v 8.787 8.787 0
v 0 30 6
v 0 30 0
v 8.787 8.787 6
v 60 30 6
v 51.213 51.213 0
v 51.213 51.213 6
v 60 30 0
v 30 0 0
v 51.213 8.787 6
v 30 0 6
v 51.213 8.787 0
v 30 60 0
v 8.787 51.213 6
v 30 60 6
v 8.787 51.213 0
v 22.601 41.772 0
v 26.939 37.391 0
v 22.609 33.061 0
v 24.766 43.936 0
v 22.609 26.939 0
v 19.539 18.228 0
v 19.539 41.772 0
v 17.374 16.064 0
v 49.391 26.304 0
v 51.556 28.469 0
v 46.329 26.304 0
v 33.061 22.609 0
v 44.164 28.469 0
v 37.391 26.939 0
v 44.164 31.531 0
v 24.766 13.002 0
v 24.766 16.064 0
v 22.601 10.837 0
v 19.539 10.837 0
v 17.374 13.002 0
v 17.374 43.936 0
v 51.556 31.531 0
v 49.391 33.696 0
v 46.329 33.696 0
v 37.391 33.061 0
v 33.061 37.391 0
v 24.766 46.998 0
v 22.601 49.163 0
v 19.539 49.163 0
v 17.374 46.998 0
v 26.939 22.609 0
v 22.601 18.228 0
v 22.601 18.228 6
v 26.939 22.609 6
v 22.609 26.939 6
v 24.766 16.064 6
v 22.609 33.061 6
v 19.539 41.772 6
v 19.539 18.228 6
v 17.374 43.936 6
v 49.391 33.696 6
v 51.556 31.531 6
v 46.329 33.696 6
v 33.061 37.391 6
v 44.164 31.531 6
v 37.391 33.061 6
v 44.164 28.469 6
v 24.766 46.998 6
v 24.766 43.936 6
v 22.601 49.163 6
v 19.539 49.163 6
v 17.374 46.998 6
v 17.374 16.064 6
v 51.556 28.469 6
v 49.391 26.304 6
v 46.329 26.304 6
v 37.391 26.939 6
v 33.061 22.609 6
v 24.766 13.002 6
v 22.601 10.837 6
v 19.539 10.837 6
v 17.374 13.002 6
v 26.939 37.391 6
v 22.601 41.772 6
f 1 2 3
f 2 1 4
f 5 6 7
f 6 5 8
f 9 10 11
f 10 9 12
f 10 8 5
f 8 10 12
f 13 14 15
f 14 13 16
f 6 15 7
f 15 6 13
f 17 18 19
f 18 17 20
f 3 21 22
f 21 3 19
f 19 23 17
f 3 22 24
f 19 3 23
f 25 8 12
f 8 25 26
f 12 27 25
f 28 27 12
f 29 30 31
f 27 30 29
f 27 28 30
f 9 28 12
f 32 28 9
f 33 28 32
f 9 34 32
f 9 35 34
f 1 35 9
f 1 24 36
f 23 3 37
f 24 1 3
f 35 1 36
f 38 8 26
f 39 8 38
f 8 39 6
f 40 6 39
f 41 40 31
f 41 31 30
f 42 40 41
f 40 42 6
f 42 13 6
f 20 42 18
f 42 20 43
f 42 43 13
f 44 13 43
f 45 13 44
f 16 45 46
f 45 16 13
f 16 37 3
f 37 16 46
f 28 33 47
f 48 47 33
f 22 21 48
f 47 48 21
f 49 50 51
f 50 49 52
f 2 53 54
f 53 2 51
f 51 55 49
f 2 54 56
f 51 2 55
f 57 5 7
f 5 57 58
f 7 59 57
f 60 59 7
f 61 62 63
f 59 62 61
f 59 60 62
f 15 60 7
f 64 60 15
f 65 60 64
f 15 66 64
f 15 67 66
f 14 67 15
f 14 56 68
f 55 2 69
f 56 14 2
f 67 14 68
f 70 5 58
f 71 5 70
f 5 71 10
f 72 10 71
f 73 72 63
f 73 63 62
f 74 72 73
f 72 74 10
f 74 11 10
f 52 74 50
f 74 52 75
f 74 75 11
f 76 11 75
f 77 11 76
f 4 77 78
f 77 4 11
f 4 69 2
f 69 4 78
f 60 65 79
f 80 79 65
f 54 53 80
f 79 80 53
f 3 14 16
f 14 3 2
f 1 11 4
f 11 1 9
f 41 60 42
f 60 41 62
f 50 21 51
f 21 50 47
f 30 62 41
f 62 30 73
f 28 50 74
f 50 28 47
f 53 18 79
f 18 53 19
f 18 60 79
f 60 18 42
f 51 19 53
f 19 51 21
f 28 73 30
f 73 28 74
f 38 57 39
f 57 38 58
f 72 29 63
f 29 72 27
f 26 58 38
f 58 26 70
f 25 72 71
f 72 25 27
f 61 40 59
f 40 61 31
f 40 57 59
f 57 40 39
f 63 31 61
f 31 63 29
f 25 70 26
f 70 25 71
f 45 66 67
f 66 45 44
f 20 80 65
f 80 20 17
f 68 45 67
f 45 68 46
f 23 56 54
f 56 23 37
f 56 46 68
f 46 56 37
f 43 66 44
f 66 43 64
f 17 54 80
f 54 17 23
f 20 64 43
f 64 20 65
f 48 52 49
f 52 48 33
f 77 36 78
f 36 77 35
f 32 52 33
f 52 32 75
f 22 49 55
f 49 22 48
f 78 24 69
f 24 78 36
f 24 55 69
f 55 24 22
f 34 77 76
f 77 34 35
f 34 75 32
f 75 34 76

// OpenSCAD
$fn = 32;

// ----------------------------------------------------------------------
// Polygon plate: 8-gon R30, 3 bolt windows
// ----------------------------------------------------------------------

// --- parameters (mm) ---
sides = 8;                // number of polygon sides
plate_r = 30;             // circumscribed radius of the polygon
bore_r = 8;               // centre bore radius
bolts = 3;                // number of bolt windows
ring_r = 17.86;           // bolt-circle radius
bolt_r = 4;               // bolt window radius
plate_t = 6;              // plate thickness, Z (extrusion height)

plate_d = 2 * plate_r;  // circumscribed diameter
bore_d = 2 * bore_r;  // centre bore diameter
bolt_d = 2 * bolt_r;  // bolt window diameter
ring_d = 2 * ring_r;  // bolt-circle diameter

profile = [[60, 30], [51.213, 51.213], [30, 60], [8.787, 51.213], [0, 30], [8.787, 8.787], [30, 0], [51.213, 8.787]];  // primary outline, 8 points, counter clockwise
void_1 = [[37.391, 33.061], [33.061, 37.391], [26.939, 37.391], [22.609, 33.061], [22.609, 26.939], [26.939, 22.609], [33.061, 22.609], [37.391, 26.939]];  // centre bore, 8 points
void_2 = [[51.556, 31.531], [49.391, 33.696], [46.329, 33.696], [44.164, 31.531], [44.164, 28.469], [46.329, 26.304], [49.391, 26.304], [51.556, 28.469]];  // bolt window 1, 8 points
void_3 = [[24.766, 46.998], [22.601, 49.163], [19.539, 49.163], [17.374, 46.998], [17.374, 43.936], [19.539, 41.772], [22.601, 41.772], [24.766, 43.936]];  // bolt window 2, 8 points
void_4 = [[24.766, 16.064], [22.601, 18.228], [19.539, 18.228], [17.374, 16.064], [17.374, 13.002], [19.539, 10.837], [22.601, 10.837], [24.766, 13.002]];  // bolt window 3, 8 points

// --- the one profile operation ---
difference() {
  linear_extrude(height = plate_t) polygon(points = profile);
  translate([0, 0, -1])
    linear_extrude(height = plate_t + 2) polygon(points = void_1);
  translate([0, 0, -1])
    linear_extrude(height = plate_t + 2) polygon(points = void_2);
  translate([0, 0, -1])
    linear_extrude(height = plate_t + 2) polygon(points = void_3);
  translate([0, 0, -1])
    linear_extrude(height = plate_t + 2) polygon(points = void_4);
}
